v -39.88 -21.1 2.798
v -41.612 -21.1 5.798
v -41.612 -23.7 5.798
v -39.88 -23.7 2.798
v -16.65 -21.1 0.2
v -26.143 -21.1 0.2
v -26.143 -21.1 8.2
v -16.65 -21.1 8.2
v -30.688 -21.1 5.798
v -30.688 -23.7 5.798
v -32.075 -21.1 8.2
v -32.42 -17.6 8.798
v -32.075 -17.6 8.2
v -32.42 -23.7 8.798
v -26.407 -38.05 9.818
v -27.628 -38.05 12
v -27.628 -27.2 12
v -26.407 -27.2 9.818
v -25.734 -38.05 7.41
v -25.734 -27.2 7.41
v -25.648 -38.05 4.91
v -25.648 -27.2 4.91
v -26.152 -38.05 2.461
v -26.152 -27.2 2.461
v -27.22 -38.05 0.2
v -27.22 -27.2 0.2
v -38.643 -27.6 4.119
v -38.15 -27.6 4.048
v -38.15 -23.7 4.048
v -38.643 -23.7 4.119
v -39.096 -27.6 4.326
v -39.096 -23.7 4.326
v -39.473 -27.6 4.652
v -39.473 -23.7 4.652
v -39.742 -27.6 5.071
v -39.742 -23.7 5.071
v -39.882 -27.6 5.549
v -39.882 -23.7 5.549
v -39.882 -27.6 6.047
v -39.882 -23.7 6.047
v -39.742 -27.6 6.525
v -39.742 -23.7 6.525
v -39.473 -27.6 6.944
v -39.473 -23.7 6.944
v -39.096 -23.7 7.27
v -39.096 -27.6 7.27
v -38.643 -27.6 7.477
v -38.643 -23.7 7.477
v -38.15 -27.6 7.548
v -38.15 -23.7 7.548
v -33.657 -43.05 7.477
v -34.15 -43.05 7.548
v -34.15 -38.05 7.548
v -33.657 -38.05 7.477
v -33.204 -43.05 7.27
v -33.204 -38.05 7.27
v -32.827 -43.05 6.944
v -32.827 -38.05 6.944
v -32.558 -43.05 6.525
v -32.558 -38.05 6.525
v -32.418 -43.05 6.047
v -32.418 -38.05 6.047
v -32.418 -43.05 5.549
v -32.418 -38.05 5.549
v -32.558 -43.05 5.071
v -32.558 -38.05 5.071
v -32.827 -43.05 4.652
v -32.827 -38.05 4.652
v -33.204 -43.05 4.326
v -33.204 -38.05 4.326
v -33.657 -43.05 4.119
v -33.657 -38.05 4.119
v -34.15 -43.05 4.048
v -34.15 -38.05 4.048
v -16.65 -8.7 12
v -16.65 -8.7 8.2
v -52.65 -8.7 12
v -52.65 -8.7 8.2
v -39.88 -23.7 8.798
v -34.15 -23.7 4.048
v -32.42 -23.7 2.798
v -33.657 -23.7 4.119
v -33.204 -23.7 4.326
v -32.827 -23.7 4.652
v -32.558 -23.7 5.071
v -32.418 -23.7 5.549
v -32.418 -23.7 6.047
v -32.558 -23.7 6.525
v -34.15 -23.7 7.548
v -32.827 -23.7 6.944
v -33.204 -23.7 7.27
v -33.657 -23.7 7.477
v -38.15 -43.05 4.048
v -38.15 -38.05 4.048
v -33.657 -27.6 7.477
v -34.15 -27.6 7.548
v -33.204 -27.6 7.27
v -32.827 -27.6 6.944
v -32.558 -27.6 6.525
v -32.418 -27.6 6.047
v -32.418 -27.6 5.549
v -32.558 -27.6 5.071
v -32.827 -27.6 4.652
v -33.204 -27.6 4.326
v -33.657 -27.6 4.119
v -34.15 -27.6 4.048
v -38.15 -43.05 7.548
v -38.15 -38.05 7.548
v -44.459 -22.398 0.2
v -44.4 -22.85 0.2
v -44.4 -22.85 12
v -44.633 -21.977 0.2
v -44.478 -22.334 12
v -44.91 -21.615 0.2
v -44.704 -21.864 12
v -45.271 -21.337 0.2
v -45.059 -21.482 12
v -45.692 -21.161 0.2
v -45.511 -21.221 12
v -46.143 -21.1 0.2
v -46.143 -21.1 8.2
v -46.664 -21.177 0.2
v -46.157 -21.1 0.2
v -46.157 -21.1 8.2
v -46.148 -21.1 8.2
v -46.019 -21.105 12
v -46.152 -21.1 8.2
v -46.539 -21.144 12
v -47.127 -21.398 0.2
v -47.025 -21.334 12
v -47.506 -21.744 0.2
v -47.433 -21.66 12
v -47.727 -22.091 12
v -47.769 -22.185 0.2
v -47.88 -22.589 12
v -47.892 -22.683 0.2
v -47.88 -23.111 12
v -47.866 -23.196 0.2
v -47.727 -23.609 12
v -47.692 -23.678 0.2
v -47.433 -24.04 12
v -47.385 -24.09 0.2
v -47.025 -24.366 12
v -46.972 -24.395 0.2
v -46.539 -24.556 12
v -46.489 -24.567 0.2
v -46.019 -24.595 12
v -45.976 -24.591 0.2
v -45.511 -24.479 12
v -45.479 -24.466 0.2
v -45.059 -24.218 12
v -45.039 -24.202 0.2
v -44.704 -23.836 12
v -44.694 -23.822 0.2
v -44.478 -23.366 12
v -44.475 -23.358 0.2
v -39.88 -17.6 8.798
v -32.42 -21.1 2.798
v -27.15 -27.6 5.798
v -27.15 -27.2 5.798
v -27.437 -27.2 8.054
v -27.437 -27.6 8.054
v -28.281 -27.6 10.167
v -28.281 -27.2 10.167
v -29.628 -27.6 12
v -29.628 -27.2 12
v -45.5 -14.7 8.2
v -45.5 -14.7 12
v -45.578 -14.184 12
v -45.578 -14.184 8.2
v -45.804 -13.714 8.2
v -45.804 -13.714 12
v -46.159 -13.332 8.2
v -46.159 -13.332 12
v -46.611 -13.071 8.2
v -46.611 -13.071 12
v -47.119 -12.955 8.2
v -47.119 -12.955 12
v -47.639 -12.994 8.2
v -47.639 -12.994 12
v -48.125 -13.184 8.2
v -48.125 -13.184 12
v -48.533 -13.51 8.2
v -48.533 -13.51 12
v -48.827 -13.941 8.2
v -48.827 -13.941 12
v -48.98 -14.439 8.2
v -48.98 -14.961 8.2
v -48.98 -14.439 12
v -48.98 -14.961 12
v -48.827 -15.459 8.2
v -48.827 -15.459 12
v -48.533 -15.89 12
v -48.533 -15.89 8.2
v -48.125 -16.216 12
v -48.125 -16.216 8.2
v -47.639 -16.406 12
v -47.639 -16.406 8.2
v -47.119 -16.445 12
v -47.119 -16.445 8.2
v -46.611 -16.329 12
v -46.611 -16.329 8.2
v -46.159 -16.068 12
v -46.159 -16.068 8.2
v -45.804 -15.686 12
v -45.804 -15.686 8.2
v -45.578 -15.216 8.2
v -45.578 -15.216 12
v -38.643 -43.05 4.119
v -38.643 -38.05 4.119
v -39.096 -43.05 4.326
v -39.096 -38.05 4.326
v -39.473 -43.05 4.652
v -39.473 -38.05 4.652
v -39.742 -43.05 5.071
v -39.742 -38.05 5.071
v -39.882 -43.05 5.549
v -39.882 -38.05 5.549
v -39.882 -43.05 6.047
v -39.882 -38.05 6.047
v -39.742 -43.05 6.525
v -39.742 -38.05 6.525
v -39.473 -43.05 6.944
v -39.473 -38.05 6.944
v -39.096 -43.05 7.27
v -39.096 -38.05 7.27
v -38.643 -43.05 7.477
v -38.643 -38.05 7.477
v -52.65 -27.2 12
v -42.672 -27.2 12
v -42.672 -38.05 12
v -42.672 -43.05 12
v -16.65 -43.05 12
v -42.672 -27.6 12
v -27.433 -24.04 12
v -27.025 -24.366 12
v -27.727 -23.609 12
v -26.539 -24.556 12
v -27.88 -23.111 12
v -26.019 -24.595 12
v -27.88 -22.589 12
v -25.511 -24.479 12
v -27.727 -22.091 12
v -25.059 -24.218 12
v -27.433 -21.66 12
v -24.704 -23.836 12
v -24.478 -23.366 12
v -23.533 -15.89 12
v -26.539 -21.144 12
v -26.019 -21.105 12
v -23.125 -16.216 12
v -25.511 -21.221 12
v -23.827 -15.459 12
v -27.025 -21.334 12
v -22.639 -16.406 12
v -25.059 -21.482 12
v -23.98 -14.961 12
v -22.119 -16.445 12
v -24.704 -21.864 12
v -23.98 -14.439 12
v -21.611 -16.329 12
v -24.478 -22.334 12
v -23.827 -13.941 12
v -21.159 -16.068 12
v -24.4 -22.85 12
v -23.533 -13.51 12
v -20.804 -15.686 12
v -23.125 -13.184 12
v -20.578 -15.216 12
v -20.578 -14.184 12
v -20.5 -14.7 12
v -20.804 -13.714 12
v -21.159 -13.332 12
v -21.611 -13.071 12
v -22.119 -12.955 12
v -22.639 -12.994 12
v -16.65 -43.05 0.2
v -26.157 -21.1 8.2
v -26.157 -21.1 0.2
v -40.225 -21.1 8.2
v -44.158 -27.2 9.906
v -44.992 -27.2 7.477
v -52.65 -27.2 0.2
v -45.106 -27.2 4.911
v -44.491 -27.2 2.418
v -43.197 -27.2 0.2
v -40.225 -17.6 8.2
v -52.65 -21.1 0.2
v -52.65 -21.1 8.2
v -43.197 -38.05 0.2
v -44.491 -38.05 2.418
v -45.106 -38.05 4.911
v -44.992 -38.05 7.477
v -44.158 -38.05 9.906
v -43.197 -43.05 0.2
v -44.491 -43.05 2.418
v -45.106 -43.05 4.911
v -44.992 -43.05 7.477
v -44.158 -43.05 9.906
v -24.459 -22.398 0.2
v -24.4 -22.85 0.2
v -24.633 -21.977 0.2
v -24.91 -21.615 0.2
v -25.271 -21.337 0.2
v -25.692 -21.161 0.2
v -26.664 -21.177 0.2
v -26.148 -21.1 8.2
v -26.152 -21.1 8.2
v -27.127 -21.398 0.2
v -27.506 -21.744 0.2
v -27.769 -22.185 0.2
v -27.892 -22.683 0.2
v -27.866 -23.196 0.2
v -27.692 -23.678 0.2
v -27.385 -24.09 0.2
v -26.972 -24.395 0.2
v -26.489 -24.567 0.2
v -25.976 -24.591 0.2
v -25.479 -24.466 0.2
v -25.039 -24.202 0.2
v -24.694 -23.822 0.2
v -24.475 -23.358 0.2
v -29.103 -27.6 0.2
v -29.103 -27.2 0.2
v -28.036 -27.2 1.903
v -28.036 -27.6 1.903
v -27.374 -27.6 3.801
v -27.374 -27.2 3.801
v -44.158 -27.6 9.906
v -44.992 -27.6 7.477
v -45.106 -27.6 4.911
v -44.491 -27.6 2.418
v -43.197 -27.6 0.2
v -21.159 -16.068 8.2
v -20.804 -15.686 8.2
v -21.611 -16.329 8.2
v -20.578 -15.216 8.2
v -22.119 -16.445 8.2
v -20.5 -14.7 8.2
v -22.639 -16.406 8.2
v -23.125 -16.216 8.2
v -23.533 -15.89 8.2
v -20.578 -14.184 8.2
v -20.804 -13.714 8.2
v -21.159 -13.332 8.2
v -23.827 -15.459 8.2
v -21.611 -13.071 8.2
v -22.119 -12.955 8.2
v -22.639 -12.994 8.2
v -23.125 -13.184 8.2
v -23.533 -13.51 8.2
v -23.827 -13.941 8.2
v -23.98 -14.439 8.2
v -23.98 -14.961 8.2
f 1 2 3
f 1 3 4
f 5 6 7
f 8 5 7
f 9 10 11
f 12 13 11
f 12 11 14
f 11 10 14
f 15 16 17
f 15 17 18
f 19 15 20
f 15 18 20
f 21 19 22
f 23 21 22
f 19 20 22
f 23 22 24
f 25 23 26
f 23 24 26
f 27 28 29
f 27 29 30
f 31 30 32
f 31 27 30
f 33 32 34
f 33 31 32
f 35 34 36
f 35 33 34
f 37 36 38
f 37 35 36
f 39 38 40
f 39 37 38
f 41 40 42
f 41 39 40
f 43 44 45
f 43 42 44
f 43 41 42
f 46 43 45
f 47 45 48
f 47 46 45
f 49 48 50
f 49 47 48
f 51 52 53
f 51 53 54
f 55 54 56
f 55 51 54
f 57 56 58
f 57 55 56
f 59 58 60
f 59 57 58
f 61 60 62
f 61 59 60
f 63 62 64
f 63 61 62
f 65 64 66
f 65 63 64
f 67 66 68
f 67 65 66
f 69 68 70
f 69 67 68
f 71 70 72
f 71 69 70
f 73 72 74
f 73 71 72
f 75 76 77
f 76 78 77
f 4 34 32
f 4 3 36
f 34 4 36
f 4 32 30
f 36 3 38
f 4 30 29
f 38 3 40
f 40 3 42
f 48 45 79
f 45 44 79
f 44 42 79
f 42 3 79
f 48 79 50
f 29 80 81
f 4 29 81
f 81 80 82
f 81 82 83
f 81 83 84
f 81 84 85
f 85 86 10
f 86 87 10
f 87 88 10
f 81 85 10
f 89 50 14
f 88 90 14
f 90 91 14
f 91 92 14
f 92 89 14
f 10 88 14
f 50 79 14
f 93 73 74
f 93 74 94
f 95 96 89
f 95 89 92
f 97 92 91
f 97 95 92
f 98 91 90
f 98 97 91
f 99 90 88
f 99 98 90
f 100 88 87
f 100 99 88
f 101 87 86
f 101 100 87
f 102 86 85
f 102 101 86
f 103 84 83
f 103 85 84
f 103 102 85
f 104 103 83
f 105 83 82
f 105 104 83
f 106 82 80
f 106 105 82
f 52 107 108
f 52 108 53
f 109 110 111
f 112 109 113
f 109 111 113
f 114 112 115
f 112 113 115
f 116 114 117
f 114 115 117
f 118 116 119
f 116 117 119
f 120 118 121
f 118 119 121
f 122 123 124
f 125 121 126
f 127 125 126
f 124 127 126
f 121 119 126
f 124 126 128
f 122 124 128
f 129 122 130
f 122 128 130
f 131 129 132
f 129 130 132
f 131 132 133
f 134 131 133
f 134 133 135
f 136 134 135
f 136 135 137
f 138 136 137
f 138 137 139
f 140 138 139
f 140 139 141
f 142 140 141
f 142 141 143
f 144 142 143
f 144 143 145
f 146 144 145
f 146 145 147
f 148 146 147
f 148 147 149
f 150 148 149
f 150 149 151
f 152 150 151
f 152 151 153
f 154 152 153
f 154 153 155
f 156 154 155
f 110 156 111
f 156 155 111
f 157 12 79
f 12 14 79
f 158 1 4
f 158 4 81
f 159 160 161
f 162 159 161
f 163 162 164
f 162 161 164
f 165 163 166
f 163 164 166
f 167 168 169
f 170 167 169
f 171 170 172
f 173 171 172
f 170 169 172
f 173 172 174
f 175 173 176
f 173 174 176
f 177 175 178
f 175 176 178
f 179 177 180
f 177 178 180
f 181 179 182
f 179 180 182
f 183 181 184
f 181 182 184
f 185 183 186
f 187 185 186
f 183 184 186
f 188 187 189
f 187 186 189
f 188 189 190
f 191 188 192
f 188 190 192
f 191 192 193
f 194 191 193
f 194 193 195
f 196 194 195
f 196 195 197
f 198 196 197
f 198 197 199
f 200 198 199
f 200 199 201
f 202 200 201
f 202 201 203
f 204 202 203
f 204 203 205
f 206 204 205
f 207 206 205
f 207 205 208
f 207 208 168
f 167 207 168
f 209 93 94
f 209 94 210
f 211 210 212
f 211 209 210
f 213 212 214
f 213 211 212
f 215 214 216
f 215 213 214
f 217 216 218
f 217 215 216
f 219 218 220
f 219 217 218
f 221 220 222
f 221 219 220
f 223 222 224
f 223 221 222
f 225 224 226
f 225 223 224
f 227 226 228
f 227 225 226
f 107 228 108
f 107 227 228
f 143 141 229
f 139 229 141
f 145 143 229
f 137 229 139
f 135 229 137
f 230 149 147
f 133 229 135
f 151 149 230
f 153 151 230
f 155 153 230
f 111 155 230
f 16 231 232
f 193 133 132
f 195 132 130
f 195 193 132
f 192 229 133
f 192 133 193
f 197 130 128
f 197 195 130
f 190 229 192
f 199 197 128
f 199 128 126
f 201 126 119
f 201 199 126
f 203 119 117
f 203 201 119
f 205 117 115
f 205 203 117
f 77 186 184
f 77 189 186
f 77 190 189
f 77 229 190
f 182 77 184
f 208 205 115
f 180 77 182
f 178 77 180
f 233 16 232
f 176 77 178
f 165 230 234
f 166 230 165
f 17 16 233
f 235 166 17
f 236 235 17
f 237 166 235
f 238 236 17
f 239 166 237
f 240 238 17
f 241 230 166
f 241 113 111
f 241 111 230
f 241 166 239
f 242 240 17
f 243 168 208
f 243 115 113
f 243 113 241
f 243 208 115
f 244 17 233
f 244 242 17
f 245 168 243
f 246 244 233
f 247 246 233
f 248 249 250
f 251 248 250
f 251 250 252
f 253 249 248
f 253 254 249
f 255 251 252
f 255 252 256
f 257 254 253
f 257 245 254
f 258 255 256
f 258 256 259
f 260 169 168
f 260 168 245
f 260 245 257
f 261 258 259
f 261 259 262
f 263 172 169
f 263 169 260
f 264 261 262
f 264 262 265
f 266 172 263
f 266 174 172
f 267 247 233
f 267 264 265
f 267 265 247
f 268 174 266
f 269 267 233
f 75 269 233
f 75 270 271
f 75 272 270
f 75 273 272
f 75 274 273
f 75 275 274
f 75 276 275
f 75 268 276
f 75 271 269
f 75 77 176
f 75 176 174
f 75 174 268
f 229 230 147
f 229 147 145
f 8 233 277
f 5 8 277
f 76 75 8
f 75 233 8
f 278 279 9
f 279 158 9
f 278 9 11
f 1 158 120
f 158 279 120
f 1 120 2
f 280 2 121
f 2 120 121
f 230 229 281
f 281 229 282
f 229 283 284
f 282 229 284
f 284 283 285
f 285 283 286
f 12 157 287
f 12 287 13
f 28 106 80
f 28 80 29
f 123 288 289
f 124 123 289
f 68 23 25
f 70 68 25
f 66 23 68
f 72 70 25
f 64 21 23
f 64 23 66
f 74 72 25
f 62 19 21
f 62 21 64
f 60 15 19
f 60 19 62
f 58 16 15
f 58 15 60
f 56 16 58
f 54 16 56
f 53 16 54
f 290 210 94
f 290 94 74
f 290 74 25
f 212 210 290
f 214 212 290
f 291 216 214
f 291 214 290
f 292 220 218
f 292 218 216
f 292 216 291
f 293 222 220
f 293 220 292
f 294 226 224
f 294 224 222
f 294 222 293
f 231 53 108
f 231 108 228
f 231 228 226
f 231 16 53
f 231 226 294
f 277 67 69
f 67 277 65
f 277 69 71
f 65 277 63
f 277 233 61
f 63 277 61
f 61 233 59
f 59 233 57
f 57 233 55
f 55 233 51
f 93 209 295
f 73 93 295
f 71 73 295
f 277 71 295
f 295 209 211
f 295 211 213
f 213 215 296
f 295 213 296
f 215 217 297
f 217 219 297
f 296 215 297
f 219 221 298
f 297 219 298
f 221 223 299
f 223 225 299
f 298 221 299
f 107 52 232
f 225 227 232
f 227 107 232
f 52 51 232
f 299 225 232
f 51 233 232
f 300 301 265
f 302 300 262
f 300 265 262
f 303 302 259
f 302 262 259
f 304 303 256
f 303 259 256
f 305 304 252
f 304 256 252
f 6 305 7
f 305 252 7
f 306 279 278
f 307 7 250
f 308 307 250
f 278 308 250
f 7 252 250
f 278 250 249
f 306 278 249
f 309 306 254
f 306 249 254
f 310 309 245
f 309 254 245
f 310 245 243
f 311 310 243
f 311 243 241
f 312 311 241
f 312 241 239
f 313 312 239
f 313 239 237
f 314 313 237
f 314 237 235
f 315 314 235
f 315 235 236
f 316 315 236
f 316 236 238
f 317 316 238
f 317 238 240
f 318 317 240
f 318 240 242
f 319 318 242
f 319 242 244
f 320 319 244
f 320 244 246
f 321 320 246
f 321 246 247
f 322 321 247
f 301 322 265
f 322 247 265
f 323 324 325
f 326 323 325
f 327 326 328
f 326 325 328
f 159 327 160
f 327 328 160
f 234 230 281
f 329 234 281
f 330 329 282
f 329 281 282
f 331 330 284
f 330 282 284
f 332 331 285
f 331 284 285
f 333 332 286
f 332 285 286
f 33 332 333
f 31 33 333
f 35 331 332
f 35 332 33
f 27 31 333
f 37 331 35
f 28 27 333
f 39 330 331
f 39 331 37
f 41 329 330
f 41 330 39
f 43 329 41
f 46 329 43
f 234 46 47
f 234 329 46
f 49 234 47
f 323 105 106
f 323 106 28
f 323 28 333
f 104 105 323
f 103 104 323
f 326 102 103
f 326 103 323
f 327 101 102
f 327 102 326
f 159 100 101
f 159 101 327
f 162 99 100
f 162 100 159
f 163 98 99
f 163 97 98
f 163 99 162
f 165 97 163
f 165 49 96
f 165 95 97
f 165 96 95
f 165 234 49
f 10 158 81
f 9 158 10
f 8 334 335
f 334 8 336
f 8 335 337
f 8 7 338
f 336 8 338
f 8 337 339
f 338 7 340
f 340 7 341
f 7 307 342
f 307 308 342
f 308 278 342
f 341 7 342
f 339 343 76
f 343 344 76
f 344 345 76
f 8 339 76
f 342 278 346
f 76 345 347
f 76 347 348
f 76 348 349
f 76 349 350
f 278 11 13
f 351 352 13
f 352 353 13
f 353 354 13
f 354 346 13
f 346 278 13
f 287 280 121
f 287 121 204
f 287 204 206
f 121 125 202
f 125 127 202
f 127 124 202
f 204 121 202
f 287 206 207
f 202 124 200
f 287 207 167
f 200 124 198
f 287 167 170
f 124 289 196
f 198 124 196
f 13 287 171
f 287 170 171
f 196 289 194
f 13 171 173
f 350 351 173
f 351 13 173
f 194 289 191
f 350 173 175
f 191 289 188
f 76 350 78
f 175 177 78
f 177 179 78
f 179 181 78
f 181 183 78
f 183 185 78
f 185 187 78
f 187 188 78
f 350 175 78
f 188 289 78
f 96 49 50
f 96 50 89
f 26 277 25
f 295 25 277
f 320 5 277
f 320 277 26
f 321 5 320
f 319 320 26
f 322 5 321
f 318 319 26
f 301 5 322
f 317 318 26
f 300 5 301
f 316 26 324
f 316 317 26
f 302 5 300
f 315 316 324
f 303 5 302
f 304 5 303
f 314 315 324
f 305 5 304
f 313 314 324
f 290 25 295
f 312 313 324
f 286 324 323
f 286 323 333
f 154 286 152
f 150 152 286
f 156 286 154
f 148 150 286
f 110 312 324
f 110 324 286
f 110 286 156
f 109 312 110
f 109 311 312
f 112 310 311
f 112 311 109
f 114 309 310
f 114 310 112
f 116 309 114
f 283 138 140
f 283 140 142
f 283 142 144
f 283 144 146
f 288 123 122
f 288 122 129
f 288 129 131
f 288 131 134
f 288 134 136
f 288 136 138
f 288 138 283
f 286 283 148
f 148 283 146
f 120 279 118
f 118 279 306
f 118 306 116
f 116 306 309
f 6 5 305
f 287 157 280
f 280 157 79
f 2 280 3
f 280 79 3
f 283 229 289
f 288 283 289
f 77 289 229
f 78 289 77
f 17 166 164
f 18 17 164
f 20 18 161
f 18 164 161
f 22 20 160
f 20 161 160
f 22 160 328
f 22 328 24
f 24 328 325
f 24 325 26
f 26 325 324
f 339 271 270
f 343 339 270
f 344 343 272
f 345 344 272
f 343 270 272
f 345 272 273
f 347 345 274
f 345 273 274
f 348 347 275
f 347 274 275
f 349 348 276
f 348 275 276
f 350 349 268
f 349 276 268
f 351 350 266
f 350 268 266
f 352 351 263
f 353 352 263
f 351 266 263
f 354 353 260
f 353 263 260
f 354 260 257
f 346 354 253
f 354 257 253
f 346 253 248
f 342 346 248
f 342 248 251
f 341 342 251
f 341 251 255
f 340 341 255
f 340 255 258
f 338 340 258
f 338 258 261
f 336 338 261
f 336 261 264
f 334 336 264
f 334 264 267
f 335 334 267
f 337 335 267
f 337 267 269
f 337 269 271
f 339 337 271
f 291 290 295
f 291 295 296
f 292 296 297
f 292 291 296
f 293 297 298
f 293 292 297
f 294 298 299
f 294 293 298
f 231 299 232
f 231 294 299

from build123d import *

# Parameters (mm, degrees)
SALIENTE_EXTRUIR2_START    = 0.2
CROQUIS2_W                 = 33
CROQUIS2_H                 = 6.1
SALIENTE_EXTRUIR2_DEPTH    = 11.8
SALIENTE_EXTRUIR3_DEPTH    = 18.5
SALIENTE_EXTRUIR5_DEPTH    = 0.4
SALIENTE_EXTRUIR6_DEPTH    = 3
CORTAR_EXTRUIR1_REACH      = 13.8
CROQUIS5_R                 = 1.75
CORTAR_EXTRUIR2_START      = -6.1
CORTAR_EXTRUIR2_DEPTH      = 2.6
CORTAR_EXTRUIR2_DEPTH_BACK = 3.5
CORTAR_EXTRUIR3_DEPTH      = 1.4
CORTAR_EXTRUIR3_DEPTH_BACK = 19.5
SALIENTE_EXTRUIR7_DEPTH    = 10.85
SALIENTE_EXTRUIR8_DEPTH    = 5
CORTAR_EXTRUIR4_DEPTH      = 35.35


with BuildPart() as part:
    # Croquis2 → Saliente-Extruir2 (new body)
    with BuildSketch(Plane.XY.offset(SALIENTE_EXTRUIR2_START)):
        with Locations((-36.15, -24.15)):
            Rectangle(CROQUIS2_W, CROQUIS2_H)
    extrude(amount=SALIENTE_EXTRUIR2_DEPTH)

    # Croquis3 → Saliente-Extruir3 (add)
    with BuildSketch(Plane.XZ.offset(27.2)):
        with BuildLine():
            Line((-42.671948935, 12), (-52.65, 12))
            Line((-52.65, 12), (-52.65, 8.2))
            Line((-52.65, 8.2), (-44.823559642, 8.2))
            ThreePointArc((-44.823559642, 8.2), (-43.981722047, 10.232475667), (-42.671948935, 12))
        make_face()
        with BuildLine():
            Line((-19.65, 12), (-29.628051065, 12))
            ThreePointArc((-29.628051065, 12), (-28.318277953, 10.232475667), (-27.476440358, 8.2))
            Line((-27.476440358, 8.2), (-19.65, 8.2))
            Line((-19.65, 8.2), (-19.65, 12))
        make_face()
        with BuildLine():
            Line((-29.628051065, 12), (-42.671948935, 12))
            ThreePointArc((-42.671948935, 12), (-43.981722047, 10.232475667), (-44.823559642, 8.2))
            Line((-44.823559642, 8.2), (-27.476440358, 8.2))
            ThreePointArc((-27.476440358, 8.2), (-28.318277953, 10.232475667), (-29.628051065, 12))
        make_face()
    extrude(amount=-SALIENTE_EXTRUIR3_DEPTH)

    # Croquis4 → Saliente-Extruir5 (add)
    with BuildSketch(Plane.XZ.offset(27.2)):
        with BuildLine():
            ThreePointArc((-27.15, 5.798050138), (-27.79244233, 9.137395851), (-29.628051065, 12))
            Line((-29.628051065, 12), (-42.671948935, 12))
            ThreePointArc((-42.671948935, 12), (-45.141099841, 6.198204681), (-43.197115342, 0.2))
            Line((-43.197115342, 0.2), (-29.102884658, 0.2))
            ThreePointArc((-29.102884658, 0.2), (-27.652234468, 2.833597245), (-27.15, 5.798050138))
        make_face()
    extrude(amount=SALIENTE_EXTRUIR5_DEPTH)

    # Croquis6 → Saliente-Extruir6 (add)
    with BuildSketch(Plane(origin=(-19.65, 0, 0), x_dir=(0, 0, -1), z_dir=(1, 0, 0))):
        Polygon((-0.2, -21.1), (-8.2, -21.1), (-8.2, -8.7), (-12, -8.7), (-12, -27.2), (-0.2, -27.2), align=None)
    extrude(amount=SALIENTE_EXTRUIR6_DEPTH)

    # Croquis5 → Cortar-Extruir1 (cut, up to next)
    with BuildSketch(Plane.XY.offset(12), mode=Mode.PRIVATE) as cortar_extruir1_sk1:
        with Locations((-22.25, -14.7)):
            Circle(CROQUIS5_R)
    cortar_extruir1_tool1 = extrude(cortar_extruir1_sk1.sketch, amount=-CORTAR_EXTRUIR1_REACH, mode=Mode.PRIVATE) & part.part
    add(cortar_extruir1_tool1.solids().sort_by_distance((-22.25, -14.7, 12))[0], mode=Mode.SUBTRACT)
    # Croquis5 → Cortar-Extruir1 (cut, up to next)
    with BuildSketch(Plane.XY.offset(12), mode=Mode.PRIVATE) as cortar_extruir1_sk2:
        with Locations((-47.25, -14.7)):
            Circle(CROQUIS5_R)
    cortar_extruir1_tool2 = extrude(cortar_extruir1_sk2.sketch, amount=-CORTAR_EXTRUIR1_REACH, mode=Mode.PRIVATE) & part.part
    add(cortar_extruir1_tool2.solids().sort_by_distance((-47.25, -14.7, 12))[0], mode=Mode.SUBTRACT)
    # Croquis5 → Cortar-Extruir1 (cut, up to next)
    with BuildSketch(Plane.XY.offset(12), mode=Mode.PRIVATE) as cortar_extruir1_sk3:
        with Locations((-46.15, -22.849986467)):
            Circle(CROQUIS5_R)
    cortar_extruir1_tool3 = extrude(cortar_extruir1_sk3.sketch, amount=-CORTAR_EXTRUIR1_REACH, mode=Mode.PRIVATE) & part.part
    add(cortar_extruir1_tool3.solids().sort_by_distance((-46.15, -22.849986, 12))[0], mode=Mode.SUBTRACT)
    # Croquis5 → Cortar-Extruir1 (cut, up to next)
    with BuildSketch(Plane.XY.offset(12), mode=Mode.PRIVATE) as cortar_extruir1_sk4:
        with Locations((-26.15, -22.849986467)):
            Circle(CROQUIS5_R)
    cortar_extruir1_tool4 = extrude(cortar_extruir1_sk4.sketch, amount=-CORTAR_EXTRUIR1_REACH, mode=Mode.PRIVATE) & part.part
    add(cortar_extruir1_tool4.solids().sort_by_distance((-26.15, -22.849986, 12))[0], mode=Mode.SUBTRACT)

    # Croquis7 → Cortar-Extruir2 (cut, two sides)
    with BuildSketch(Plane.XZ.offset(27.2).offset(CORTAR_EXTRUIR2_START)) as cortar_extruir2_sk:
        Polygon((-41.612050808, 5.798050138), (-39.88, 2.798050138), (-32.42, 2.798050138), (-30.687949192, 5.798050138), (-32.42, 8.798050138), (-39.88, 8.798050138), align=None)
    extrude(amount=CORTAR_EXTRUIR2_DEPTH, mode=Mode.SUBTRACT)
    extrude(cortar_extruir2_sk.sketch, amount=-CORTAR_EXTRUIR2_DEPTH_BACK, mode=Mode.SUBTRACT)

    # Croquis7<3> → Cortar-Extruir3 (cut, two sides)
    with BuildSketch(Plane.XZ.offset(27.2)) as cortar_extruir3_sk:
        with BuildLine():
            ThreePointArc((-37.85, 5.798050138), (-36.15, 4.098050138), (-34.45, 5.798050138))
            Line((-34.45, 5.798050138), (-37.85, 5.798050138))
        make_face()
        with BuildLine():
            Line((-37.85, 5.798050138), (-34.45, 5.798050138))
            ThreePointArc((-34.45, 5.798050138), (-36.15, 7.498050138), (-37.85, 5.798050138))
        make_face()
    extrude(amount=CORTAR_EXTRUIR3_DEPTH, mode=Mode.SUBTRACT)
    extrude(cortar_extruir3_sk.sketch, amount=-CORTAR_EXTRUIR3_DEPTH_BACK, mode=Mode.SUBTRACT)

    # Croquis8 → Saliente-Extruir7 (add)
    with BuildSketch(Plane.XZ.offset(27.2)):
        with BuildLine():
            Line((-27.219735144, 0.2), (-16.65, 0.2))
            Line((-16.65, 0.2), (-16.65, 12))
            Line((-16.65, 12), (-27.628051065, 12))
            ThreePointArc((-27.628051065, 12), (-25.616484844, 6.162541828), (-27.219735144, 0.2))
        make_face()
    extrude(amount=SALIENTE_EXTRUIR7_DEPTH)

    # Croquis9 → Saliente-Extruir8 (add)
    with BuildSketch(Plane.XZ.offset(38.05)):
        with BuildLine():
            Line((-16.65, 12), (-16.65, 0.2))
            Line((-16.65, 0.2), (-43.197115342, 0.2))
            ThreePointArc((-43.197115342, 0.2), (-45.141099841, 6.198204681), (-42.671948935, 12))
            Line((-42.671948935, 12), (-16.65, 12))
        make_face()
    extrude(amount=SALIENTE_EXTRUIR8_DEPTH)

    # Croquis10 → Cortar-Extruir4 (cut, through all)
    with BuildSketch(Plane.XZ.offset(43.05)):
        with BuildLine():
            Line((-38.15, 7.548050138), (-34.15, 7.548050138))
            ThreePointArc((-34.15, 7.548050138), (-32.4, 5.798050138), (-34.15, 4.048050138))
            Line((-34.15, 4.048050138), (-38.15, 4.048050138))
            ThreePointArc((-38.15, 4.048050138), (-39.9, 5.798050138), (-38.15, 7.548050138))
        make_face()
    extrude(amount=-CORTAR_EXTRUIR4_DEPTH, mode=Mode.SUBTRACT)


solid = part.part
